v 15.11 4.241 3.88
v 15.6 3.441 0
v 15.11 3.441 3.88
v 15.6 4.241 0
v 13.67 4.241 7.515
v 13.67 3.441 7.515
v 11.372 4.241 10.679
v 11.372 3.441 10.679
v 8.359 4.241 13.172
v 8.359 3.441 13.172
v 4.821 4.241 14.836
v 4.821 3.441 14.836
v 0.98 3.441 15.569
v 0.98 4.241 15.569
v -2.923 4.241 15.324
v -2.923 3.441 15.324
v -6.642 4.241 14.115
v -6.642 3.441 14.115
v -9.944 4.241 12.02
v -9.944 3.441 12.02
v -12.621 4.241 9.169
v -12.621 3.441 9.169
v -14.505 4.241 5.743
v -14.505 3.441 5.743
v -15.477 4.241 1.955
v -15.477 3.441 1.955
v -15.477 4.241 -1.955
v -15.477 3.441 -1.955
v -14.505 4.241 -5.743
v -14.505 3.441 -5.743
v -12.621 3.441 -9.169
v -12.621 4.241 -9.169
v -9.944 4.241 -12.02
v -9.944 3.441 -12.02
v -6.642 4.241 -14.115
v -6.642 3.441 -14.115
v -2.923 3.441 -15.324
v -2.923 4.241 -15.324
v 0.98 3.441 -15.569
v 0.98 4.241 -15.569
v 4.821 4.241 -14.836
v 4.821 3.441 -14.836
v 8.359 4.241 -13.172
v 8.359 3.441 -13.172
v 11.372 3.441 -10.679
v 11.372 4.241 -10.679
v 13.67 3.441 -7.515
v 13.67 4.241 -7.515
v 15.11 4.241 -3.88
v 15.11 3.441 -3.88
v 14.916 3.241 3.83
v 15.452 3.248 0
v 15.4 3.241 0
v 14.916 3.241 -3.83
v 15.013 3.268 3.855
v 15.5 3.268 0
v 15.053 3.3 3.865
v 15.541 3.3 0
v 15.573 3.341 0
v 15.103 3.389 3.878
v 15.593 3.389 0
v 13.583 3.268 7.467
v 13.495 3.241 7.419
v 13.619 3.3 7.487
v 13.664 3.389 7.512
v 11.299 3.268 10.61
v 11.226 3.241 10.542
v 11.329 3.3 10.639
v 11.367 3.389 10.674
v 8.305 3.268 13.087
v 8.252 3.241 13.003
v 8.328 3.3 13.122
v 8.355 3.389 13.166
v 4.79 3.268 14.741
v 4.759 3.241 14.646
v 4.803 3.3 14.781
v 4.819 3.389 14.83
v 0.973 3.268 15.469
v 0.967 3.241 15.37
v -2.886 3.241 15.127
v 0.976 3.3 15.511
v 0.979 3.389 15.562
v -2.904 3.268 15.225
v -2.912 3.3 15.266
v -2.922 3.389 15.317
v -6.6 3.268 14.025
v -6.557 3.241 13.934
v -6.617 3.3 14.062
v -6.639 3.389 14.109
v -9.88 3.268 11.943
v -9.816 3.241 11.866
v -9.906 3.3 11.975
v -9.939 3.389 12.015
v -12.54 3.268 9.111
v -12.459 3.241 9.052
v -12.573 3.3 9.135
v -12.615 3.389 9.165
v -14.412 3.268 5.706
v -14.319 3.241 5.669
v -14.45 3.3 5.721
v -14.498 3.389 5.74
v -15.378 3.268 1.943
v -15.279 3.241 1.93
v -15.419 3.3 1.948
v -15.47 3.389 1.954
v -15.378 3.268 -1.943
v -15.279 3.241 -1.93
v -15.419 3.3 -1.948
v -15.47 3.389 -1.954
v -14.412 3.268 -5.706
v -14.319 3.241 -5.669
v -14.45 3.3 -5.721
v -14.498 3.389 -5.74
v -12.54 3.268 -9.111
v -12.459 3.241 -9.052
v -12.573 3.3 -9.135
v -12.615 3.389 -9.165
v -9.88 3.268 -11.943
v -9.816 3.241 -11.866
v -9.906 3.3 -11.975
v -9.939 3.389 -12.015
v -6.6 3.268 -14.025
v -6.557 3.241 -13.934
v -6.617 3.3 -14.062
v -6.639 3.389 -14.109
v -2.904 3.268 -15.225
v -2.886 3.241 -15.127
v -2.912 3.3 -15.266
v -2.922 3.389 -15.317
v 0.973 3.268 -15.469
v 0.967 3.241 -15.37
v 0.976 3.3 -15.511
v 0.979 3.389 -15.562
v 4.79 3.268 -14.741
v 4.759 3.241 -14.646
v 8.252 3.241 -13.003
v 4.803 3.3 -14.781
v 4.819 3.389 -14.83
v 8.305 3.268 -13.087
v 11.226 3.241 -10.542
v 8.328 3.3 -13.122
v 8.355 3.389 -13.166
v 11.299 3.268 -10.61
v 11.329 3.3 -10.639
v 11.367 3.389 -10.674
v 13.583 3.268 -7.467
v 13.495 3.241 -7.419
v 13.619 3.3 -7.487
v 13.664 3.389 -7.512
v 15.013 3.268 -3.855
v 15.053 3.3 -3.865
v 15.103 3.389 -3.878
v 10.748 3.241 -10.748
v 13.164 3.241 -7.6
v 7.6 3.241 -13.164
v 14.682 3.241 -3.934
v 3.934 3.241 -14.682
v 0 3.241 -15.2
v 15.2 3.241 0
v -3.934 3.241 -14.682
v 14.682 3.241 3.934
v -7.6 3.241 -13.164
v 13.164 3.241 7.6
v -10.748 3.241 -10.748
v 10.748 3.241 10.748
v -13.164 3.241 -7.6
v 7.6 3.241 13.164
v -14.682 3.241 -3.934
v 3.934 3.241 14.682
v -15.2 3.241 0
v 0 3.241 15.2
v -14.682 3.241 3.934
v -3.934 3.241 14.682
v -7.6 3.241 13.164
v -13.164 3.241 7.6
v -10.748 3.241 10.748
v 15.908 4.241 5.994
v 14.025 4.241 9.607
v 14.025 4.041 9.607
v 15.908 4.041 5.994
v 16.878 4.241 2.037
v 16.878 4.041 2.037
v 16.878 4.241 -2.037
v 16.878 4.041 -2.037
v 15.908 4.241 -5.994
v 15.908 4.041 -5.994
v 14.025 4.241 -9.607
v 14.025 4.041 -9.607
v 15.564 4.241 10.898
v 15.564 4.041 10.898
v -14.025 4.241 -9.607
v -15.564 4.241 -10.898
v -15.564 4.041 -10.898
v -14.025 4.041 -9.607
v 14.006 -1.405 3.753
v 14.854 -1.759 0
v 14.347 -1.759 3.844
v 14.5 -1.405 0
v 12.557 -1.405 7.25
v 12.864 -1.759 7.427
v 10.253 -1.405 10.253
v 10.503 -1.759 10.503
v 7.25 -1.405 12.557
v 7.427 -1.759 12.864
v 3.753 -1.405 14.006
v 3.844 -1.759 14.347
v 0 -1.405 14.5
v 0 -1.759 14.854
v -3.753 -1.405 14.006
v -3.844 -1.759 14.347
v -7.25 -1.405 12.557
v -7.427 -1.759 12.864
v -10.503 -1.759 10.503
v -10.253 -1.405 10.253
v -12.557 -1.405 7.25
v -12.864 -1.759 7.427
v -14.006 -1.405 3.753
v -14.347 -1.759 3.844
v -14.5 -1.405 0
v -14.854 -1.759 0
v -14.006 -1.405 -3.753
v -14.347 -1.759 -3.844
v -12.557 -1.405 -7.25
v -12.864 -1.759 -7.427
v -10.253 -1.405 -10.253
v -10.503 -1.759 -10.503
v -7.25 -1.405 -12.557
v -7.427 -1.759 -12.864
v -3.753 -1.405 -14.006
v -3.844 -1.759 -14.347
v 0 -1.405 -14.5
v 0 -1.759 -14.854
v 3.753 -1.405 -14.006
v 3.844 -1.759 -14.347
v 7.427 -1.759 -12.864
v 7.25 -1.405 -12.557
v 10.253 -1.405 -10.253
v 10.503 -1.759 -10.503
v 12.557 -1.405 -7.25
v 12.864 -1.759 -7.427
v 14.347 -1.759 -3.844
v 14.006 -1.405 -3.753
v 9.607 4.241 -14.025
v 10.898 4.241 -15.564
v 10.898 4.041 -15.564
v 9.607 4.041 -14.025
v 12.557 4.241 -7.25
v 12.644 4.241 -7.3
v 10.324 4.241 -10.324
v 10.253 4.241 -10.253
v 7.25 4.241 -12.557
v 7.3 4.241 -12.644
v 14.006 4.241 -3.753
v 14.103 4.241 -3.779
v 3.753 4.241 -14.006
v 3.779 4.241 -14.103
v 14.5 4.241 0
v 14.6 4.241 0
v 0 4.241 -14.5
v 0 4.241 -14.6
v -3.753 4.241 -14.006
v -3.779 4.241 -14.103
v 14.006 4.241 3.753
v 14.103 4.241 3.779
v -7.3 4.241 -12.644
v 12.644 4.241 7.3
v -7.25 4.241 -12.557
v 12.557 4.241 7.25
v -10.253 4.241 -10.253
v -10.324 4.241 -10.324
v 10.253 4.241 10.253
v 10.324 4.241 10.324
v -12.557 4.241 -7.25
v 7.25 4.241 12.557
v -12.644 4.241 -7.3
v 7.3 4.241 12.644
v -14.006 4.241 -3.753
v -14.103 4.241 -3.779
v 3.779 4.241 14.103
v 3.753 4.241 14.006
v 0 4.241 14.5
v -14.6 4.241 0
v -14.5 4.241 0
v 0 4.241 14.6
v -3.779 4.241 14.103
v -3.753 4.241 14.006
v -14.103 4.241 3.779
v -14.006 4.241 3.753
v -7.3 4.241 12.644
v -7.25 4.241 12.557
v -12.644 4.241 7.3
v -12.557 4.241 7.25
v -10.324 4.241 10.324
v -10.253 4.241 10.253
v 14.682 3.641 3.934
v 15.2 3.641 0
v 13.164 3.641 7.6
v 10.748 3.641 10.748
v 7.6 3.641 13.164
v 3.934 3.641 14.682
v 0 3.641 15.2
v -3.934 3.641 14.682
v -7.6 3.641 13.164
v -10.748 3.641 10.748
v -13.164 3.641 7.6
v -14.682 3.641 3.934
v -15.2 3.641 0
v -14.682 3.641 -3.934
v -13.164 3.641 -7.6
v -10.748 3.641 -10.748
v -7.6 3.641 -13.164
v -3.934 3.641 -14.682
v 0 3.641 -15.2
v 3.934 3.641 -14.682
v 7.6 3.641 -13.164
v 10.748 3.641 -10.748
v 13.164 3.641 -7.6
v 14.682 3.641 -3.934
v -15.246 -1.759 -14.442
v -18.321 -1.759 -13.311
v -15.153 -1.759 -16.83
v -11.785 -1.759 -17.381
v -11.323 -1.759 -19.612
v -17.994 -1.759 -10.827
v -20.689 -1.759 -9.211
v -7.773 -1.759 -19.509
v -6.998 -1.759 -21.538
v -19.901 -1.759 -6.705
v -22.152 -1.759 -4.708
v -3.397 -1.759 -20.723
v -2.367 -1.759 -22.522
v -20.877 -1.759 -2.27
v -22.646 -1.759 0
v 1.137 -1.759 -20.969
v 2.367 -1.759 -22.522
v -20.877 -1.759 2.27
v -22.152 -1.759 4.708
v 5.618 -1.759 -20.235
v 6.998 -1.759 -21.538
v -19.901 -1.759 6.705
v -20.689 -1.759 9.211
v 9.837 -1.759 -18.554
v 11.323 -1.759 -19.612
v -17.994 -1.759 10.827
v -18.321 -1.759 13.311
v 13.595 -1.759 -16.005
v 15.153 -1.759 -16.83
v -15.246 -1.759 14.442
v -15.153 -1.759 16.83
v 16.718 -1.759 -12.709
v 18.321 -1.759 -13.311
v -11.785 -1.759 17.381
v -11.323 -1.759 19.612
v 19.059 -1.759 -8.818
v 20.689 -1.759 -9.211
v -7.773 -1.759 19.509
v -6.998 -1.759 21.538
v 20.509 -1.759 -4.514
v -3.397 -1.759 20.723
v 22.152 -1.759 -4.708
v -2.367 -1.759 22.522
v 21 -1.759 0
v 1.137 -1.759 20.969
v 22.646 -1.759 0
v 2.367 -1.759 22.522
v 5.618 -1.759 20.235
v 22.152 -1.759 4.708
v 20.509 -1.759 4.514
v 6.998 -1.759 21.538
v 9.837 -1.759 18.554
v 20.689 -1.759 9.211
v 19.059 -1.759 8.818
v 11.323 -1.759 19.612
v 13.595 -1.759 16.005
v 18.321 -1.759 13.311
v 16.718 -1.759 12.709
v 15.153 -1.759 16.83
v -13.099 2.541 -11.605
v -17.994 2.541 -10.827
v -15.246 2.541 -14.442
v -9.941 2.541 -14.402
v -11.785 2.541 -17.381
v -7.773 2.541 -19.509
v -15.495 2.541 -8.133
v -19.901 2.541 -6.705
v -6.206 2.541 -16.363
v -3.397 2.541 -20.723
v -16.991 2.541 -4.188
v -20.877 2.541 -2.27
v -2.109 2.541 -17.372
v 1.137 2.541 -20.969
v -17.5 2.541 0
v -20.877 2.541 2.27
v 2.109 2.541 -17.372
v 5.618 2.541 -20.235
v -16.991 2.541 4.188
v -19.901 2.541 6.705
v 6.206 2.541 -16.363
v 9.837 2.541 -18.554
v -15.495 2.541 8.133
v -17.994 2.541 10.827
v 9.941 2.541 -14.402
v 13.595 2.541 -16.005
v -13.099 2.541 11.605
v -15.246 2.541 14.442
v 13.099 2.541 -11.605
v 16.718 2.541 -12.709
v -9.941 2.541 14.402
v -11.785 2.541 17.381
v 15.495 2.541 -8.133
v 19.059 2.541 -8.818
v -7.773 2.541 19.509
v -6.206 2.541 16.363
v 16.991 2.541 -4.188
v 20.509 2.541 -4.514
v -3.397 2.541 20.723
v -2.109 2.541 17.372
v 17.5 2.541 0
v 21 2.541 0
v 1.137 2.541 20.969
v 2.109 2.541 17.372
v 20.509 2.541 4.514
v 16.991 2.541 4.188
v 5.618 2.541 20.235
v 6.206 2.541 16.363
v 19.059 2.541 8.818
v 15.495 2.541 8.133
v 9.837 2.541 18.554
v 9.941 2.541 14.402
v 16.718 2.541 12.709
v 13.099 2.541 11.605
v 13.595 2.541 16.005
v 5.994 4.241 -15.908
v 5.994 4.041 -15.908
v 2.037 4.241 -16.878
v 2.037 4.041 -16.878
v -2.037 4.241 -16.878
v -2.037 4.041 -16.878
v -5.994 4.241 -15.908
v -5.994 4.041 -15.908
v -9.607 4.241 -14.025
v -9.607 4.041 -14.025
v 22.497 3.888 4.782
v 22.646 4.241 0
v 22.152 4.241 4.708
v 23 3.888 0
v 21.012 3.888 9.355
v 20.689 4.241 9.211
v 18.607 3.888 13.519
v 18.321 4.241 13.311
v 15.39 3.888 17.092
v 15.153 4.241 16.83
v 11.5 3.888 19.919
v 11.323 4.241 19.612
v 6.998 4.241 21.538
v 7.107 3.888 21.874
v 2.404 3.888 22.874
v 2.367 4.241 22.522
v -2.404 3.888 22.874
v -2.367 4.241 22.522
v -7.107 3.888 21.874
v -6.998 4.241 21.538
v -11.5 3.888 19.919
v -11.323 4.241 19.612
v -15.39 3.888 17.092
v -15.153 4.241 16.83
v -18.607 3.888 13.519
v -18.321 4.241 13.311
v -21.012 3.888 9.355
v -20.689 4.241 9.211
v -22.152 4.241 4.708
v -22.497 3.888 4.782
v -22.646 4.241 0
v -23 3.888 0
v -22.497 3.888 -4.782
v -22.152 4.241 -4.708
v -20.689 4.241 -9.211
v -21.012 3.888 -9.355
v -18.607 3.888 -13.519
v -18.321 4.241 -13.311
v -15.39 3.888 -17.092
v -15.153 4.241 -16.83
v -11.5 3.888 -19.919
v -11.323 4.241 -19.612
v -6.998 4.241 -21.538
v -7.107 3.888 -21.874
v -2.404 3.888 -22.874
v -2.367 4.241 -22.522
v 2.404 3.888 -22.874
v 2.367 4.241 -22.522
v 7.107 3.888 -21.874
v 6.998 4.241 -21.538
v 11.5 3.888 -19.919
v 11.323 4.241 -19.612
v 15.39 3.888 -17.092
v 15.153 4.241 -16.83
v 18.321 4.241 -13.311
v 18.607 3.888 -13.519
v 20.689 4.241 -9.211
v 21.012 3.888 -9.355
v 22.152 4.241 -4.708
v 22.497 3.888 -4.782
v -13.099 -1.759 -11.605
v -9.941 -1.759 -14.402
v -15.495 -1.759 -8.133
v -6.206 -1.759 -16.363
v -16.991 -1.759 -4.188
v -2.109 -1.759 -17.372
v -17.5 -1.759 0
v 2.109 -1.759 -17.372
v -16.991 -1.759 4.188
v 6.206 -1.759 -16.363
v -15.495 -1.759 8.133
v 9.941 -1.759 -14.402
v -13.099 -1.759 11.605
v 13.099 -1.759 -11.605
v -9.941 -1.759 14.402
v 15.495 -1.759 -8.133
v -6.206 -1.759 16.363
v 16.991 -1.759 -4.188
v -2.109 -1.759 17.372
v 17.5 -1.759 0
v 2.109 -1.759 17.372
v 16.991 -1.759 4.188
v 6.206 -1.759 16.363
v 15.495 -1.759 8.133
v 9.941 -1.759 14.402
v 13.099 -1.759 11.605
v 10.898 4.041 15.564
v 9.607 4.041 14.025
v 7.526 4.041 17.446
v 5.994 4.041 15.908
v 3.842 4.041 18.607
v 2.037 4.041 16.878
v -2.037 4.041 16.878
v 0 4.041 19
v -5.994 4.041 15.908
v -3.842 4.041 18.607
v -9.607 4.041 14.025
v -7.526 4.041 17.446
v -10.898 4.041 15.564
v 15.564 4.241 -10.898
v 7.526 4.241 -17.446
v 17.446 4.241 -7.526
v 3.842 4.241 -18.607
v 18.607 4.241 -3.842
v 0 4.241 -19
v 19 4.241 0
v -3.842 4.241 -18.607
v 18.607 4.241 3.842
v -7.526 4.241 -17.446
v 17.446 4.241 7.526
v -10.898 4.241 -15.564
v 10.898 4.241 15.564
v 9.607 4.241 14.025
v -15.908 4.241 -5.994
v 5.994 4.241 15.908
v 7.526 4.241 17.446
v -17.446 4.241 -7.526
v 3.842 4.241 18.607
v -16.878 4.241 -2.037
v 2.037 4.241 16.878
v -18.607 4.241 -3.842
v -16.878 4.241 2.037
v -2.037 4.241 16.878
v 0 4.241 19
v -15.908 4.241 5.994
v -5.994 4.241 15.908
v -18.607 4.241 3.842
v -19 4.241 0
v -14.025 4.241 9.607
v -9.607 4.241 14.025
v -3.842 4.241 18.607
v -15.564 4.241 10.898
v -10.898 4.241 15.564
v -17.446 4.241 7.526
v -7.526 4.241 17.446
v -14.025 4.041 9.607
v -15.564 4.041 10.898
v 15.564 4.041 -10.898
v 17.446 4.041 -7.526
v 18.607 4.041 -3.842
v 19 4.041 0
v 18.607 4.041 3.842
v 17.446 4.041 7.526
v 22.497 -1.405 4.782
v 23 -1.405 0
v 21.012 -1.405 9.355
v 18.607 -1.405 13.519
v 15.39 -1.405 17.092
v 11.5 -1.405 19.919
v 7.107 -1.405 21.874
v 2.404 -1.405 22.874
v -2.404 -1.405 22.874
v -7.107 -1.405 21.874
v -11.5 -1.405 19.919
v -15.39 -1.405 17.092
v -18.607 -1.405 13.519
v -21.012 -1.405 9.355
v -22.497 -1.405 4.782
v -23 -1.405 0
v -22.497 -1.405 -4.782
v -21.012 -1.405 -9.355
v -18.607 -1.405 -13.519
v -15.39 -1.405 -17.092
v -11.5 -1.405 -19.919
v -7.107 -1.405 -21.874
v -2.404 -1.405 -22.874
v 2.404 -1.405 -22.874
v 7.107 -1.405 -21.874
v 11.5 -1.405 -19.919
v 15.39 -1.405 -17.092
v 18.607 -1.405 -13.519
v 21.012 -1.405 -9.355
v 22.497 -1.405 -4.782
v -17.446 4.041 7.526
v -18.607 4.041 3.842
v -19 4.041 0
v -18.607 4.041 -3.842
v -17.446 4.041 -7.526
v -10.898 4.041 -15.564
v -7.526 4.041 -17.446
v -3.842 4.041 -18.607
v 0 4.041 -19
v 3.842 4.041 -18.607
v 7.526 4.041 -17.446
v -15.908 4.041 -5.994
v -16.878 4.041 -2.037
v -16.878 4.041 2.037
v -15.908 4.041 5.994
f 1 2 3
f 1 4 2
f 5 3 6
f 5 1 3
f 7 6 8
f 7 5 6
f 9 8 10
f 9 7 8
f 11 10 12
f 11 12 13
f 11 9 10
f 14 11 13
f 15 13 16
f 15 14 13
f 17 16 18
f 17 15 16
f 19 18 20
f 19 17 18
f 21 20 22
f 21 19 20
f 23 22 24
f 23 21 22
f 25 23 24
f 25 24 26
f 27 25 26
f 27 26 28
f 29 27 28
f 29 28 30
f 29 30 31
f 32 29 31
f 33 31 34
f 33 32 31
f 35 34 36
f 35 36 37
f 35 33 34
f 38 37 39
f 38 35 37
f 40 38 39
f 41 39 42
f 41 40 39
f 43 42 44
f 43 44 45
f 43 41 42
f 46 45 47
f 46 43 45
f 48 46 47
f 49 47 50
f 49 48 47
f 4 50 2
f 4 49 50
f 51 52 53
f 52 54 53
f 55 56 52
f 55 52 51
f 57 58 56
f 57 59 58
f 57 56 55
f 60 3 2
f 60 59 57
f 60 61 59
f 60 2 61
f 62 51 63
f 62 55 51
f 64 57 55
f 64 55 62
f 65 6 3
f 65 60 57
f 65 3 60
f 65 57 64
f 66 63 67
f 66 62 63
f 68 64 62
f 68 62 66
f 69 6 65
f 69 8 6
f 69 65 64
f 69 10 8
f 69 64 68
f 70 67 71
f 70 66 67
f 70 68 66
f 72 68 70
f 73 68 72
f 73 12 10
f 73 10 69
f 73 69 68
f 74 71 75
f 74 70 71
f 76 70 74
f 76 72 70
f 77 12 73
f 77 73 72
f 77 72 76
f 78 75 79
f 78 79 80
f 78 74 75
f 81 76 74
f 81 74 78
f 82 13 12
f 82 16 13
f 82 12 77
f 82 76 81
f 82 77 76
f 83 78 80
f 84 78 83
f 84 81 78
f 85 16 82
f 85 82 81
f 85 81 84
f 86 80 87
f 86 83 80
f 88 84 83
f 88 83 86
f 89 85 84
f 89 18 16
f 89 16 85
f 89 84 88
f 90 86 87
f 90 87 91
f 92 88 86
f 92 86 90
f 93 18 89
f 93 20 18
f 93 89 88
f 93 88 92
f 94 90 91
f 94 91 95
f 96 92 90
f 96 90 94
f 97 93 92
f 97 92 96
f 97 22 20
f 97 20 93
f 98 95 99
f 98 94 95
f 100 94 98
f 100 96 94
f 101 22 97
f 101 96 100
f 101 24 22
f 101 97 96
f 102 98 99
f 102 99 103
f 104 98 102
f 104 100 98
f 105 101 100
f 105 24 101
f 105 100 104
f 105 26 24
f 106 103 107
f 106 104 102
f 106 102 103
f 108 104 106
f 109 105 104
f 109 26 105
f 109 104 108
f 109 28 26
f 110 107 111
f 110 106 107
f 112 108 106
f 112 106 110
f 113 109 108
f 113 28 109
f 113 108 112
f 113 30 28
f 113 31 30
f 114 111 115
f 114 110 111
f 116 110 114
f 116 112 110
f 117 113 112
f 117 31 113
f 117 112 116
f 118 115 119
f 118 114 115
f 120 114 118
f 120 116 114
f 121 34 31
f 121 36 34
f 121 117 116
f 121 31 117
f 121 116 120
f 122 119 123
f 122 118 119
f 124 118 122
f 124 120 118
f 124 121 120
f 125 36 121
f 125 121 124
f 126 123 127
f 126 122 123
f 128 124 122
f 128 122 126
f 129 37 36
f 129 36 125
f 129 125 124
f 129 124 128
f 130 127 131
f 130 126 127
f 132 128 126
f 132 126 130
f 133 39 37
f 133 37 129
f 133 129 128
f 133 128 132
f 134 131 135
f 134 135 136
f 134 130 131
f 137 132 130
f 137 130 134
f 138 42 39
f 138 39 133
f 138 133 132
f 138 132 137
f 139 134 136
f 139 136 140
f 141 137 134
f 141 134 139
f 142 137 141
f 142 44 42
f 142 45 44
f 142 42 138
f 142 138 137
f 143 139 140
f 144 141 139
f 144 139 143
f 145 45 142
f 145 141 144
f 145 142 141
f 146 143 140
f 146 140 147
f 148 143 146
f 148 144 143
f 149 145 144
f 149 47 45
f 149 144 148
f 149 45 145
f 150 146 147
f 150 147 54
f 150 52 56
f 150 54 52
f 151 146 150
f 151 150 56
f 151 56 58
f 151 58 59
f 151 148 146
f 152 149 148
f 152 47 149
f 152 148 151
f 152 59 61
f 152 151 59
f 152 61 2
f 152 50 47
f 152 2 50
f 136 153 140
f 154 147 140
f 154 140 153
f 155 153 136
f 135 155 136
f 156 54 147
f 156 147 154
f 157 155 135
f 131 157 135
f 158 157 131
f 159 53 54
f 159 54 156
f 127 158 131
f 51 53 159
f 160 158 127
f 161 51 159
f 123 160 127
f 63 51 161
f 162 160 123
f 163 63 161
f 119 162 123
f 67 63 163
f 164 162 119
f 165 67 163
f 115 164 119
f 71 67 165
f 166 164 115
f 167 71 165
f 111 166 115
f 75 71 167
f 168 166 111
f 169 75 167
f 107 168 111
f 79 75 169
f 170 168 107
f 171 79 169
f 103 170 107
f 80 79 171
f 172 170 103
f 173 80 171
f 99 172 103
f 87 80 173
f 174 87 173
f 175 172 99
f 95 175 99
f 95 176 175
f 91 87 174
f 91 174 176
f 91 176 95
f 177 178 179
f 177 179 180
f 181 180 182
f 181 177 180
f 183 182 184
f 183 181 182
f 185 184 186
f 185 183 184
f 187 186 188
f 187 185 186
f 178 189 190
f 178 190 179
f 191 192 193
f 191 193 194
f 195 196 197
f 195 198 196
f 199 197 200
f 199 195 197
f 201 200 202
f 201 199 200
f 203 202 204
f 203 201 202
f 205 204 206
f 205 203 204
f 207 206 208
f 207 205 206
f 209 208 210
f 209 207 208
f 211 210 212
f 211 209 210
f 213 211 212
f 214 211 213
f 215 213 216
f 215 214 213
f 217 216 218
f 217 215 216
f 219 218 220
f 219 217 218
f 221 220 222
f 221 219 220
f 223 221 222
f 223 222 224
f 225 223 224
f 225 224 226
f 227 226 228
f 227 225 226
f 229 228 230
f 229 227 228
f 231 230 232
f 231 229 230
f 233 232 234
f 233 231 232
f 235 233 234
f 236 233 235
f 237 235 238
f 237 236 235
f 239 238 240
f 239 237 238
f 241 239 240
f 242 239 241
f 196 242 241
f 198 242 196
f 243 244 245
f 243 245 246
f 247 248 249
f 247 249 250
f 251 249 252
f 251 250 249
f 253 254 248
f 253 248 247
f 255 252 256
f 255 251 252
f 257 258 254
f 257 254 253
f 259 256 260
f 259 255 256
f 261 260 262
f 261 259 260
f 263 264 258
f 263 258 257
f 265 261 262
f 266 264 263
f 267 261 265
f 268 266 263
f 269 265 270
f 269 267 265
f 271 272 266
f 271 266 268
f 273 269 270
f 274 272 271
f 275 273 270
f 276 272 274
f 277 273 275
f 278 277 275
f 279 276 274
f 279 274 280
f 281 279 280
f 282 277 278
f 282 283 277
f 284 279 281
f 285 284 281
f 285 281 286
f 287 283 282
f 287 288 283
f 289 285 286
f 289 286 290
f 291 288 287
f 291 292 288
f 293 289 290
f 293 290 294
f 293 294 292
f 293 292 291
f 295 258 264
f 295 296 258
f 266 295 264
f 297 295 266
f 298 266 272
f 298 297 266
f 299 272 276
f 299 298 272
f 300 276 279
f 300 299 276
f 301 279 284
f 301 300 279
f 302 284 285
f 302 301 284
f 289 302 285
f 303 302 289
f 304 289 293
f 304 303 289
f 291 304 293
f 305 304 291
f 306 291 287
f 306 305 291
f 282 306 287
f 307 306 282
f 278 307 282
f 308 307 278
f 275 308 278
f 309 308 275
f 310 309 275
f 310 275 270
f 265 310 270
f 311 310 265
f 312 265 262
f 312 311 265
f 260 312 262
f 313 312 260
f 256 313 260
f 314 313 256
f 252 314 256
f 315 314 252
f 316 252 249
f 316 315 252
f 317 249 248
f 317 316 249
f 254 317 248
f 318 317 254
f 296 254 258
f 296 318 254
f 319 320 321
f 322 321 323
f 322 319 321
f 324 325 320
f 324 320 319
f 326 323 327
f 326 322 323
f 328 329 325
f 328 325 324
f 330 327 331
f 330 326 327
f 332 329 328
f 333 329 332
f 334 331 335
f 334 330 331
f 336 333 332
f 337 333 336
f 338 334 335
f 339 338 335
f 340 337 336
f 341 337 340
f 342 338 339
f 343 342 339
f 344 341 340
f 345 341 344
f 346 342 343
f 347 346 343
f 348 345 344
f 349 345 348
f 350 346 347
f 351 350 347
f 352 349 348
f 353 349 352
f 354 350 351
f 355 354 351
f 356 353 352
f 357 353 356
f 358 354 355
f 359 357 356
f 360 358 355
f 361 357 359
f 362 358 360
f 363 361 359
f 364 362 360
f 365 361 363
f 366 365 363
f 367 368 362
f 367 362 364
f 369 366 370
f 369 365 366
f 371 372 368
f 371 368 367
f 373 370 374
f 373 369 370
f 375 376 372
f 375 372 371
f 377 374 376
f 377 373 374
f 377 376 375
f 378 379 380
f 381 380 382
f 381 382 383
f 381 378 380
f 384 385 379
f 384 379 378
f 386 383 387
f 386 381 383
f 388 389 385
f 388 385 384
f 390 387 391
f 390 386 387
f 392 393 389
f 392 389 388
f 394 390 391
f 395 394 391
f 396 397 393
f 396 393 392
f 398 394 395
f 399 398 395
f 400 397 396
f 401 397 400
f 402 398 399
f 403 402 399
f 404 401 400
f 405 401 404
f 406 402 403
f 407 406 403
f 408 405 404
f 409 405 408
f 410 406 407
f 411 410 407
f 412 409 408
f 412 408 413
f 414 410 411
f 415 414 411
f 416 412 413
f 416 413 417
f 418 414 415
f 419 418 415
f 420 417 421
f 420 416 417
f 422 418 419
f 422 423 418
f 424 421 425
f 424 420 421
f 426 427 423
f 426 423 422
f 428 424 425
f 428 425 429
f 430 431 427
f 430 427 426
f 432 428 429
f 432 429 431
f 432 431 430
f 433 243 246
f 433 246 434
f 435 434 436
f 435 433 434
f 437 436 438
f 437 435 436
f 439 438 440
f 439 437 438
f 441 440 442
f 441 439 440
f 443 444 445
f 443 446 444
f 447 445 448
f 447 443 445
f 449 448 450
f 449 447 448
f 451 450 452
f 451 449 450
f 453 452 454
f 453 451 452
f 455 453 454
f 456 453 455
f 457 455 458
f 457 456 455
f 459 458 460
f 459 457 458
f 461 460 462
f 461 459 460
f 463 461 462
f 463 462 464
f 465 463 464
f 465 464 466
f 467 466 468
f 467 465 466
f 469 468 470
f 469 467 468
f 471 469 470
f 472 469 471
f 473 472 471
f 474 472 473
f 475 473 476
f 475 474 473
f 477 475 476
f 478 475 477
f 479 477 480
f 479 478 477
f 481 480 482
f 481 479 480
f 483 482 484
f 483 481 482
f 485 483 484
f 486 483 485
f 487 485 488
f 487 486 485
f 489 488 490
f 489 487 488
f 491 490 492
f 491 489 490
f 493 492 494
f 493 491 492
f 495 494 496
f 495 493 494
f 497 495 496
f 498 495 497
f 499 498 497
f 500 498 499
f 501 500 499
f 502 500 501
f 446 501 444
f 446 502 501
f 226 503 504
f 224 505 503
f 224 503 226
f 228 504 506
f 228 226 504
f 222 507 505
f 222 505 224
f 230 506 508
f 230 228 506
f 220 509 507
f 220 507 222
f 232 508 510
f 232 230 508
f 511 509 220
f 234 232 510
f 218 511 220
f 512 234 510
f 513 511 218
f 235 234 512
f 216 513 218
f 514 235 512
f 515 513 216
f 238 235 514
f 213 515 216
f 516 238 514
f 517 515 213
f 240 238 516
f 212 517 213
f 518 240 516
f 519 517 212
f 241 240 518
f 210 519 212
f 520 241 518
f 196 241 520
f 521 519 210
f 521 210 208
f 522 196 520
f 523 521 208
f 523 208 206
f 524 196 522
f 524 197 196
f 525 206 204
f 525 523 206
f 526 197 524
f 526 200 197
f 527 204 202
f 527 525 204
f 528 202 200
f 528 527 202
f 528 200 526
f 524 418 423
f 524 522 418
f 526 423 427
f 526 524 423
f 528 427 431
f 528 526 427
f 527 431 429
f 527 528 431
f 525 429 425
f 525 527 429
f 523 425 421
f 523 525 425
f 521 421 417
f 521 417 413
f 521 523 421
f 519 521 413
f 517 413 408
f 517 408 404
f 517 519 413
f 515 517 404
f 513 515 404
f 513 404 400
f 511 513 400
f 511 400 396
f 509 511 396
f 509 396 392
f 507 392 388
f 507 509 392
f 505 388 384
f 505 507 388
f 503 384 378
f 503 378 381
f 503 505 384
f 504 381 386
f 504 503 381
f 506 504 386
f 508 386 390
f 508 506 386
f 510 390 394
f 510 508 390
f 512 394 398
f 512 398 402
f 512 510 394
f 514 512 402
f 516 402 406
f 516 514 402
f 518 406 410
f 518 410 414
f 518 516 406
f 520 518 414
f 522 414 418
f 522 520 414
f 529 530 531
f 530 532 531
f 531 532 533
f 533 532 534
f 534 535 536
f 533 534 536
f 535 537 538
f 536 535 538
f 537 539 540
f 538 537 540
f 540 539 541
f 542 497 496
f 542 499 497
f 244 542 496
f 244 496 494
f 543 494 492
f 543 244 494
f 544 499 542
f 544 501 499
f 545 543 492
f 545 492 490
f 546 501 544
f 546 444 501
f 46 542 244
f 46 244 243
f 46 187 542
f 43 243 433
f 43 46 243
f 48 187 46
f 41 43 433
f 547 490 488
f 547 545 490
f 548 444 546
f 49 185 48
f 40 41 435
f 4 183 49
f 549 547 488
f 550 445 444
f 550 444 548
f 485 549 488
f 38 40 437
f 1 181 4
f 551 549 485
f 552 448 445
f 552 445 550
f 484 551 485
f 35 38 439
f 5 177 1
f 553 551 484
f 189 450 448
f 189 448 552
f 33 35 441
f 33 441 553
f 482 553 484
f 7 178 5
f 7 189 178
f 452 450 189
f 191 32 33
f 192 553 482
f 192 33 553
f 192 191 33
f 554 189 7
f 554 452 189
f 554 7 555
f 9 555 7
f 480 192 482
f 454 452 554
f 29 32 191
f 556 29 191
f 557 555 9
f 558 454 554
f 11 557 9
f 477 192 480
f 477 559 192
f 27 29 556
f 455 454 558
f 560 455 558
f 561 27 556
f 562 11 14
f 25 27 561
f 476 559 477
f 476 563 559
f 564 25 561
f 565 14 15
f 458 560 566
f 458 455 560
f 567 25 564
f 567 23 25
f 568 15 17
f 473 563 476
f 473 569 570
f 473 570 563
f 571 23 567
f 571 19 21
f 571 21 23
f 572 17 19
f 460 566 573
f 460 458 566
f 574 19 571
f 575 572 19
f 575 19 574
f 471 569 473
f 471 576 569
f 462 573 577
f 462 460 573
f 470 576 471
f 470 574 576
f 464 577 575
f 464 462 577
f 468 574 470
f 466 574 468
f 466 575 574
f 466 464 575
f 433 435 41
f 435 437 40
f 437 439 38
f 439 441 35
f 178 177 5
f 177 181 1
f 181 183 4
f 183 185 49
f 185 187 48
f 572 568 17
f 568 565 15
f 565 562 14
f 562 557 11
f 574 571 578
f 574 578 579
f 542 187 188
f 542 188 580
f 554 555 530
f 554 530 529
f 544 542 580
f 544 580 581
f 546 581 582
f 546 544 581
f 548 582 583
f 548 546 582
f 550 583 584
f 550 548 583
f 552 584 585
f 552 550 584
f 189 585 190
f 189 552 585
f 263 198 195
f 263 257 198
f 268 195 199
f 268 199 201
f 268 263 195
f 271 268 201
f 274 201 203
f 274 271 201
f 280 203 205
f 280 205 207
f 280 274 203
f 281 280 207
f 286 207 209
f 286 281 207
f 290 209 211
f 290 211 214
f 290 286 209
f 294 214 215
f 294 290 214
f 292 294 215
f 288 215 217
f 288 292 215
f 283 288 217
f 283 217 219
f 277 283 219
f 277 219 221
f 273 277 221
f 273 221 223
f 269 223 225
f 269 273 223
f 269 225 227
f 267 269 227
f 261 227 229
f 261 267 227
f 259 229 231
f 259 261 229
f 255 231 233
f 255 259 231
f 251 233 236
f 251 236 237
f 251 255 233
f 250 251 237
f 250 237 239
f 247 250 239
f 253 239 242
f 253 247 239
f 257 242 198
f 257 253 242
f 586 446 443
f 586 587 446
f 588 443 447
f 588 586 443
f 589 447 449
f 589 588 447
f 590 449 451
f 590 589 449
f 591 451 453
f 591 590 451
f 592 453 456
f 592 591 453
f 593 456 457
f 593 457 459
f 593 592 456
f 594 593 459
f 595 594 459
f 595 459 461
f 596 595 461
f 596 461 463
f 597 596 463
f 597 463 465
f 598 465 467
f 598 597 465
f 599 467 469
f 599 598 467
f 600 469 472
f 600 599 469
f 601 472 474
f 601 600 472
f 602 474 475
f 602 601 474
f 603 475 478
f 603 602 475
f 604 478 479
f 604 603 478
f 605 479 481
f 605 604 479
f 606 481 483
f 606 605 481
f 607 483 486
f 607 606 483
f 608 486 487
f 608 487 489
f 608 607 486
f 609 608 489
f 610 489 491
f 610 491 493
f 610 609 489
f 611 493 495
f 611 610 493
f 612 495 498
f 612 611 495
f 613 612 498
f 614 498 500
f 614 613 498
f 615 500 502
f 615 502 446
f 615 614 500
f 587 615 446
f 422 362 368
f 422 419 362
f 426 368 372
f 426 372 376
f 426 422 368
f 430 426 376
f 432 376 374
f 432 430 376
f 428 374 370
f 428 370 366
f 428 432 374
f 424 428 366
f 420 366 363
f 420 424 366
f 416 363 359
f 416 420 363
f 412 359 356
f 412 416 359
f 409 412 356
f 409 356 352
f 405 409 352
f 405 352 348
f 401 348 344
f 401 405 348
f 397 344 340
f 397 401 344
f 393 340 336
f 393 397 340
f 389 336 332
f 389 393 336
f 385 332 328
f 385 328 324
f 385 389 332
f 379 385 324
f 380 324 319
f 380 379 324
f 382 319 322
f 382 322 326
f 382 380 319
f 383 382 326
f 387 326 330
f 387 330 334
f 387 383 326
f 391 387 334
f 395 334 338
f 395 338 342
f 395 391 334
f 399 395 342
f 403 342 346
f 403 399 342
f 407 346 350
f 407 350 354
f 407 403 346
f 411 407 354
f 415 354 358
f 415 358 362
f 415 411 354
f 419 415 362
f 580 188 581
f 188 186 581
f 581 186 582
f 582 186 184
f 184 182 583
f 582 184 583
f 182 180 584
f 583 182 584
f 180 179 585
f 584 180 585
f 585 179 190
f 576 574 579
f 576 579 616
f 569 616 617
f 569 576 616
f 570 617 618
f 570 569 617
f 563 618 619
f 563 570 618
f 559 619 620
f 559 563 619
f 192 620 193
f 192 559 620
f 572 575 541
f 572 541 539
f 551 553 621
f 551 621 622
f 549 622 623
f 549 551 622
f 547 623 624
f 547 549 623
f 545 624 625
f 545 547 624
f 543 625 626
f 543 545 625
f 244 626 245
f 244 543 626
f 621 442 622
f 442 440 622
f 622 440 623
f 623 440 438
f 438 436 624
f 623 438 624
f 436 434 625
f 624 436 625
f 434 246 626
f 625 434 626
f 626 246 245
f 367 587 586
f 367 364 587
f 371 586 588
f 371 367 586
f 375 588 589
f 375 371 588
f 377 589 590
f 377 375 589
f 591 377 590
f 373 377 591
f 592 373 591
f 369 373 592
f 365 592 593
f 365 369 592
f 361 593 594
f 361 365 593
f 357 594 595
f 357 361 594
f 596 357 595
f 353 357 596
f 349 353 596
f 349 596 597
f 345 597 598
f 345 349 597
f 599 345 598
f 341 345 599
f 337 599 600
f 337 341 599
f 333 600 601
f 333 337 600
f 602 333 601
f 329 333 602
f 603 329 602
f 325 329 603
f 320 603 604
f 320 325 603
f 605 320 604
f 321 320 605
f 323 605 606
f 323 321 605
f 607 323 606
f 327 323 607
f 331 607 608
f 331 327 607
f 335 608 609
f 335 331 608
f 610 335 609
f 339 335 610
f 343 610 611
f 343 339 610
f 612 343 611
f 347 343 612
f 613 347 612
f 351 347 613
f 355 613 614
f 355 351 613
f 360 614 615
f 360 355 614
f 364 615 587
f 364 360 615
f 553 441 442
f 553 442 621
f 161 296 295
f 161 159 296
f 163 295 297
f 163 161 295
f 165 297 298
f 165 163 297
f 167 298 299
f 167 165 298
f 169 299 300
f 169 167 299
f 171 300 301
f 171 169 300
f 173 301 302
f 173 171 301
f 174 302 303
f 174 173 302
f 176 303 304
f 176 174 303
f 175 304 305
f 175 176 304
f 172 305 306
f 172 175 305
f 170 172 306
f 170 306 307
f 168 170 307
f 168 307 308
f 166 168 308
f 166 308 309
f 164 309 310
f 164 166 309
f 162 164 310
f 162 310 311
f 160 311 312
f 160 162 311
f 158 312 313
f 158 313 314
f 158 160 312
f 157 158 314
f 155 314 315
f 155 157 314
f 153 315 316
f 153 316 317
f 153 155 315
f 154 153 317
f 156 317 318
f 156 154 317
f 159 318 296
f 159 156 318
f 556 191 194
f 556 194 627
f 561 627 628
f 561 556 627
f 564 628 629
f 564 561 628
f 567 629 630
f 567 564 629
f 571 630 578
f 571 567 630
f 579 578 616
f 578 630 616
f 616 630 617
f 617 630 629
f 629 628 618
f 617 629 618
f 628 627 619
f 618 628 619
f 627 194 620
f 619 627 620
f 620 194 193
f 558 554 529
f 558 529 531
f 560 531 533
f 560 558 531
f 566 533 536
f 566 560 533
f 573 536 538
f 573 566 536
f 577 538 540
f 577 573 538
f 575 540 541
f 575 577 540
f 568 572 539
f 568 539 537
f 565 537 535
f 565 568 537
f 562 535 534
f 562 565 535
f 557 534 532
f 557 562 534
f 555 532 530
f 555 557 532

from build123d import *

# Parameters (mm, degrees)
CUT_EXTRUDE1_DEPTH = 0.2
CIRPATTERN1_COUNT  = 4


with BuildPart() as part:
    # Sketch1 → Revolve1 (revolve)
    with BuildSketch(Plane.XY):
        with BuildLine():
            ThreePointArc((15.4, 3.241206918), (15.541421356, 3.299785562), (15.6, 3.441206918))
            Line((15.6, 3.441206918), (15.6, 4.241206918))
            Line((15.6, 4.241206918), (22.646446609, 4.241206918))
            Line((22.646446609, 4.241206918), (23, 3.887653527))
            Line((23, 3.887653527), (23, -1.405239692))
            Line((23, -1.405239692), (22.646446609, -1.758793082))
            Line((22.646446609, -1.758793082), (21, -1.758793082))
            Line((21, -1.758793082), (21, 2.541206918))
            Line((21, 2.541206918), (17.5, 2.541206918))
            Line((17.5, 2.541206918), (17.5, -1.758793082))
            Line((17.5, -1.758793082), (14.853553391, -1.758793082))
            Line((14.853553391, -1.758793082), (14.5, -1.405239692))
            Line((14.5, -1.405239692), (14.5, 3.887653527))
            Line((14.5, 3.887653527), (14.5, 4.241206918))
            Line((14.5, 4.241206918), (14.6, 4.241206918))
            Line((14.6, 4.241206918), (15.2, 3.641206918))
            Line((15.2, 3.641206918), (15.2, 3.241206918))
            Line((15.2, 3.241206918), (15.4, 3.241206918))
        make_face()
    revolve(axis=Axis((0, 10.772096588, 0), (0, -1, 0)))

    # Sketch2 → Cut-Extrude1 (cut)
    with BuildSketch(Plane(origin=(0, 4.241206918, 0), x_dir=(1, 0, 0), z_dir=(0, 1, 0))):
        with BuildLine():
            Line((-14.025254522, -9.606884801), (-15.563888841, -10.897952291))
            ThreePointArc((-15.563888841, -10.897952291), (-19, 0), (-15.563888841, 10.897952291))
            Line((-15.563888841, 10.897952291), (-14.025254522, 9.606884801))
            ThreePointArc((-14.025254522, 9.606884801), (-17, 0), (-14.025254522, -9.606884801))
        make_face()
    cut_extrude1 = extrude(amount=-CUT_EXTRUDE1_DEPTH, mode=Mode.SUBTRACT)

    # CirPattern1: Cut-Extrude1 ×4 about axis
    cirpattern1_axis = Axis((0, 0, 0), (0, 1, 0))
    for i in range(1, CIRPATTERN1_COUNT):
        add(cut_extrude1.rotate(cirpattern1_axis, i * 360 / CIRPATTERN1_COUNT), mode=Mode.SUBTRACT)


solid = part.part
